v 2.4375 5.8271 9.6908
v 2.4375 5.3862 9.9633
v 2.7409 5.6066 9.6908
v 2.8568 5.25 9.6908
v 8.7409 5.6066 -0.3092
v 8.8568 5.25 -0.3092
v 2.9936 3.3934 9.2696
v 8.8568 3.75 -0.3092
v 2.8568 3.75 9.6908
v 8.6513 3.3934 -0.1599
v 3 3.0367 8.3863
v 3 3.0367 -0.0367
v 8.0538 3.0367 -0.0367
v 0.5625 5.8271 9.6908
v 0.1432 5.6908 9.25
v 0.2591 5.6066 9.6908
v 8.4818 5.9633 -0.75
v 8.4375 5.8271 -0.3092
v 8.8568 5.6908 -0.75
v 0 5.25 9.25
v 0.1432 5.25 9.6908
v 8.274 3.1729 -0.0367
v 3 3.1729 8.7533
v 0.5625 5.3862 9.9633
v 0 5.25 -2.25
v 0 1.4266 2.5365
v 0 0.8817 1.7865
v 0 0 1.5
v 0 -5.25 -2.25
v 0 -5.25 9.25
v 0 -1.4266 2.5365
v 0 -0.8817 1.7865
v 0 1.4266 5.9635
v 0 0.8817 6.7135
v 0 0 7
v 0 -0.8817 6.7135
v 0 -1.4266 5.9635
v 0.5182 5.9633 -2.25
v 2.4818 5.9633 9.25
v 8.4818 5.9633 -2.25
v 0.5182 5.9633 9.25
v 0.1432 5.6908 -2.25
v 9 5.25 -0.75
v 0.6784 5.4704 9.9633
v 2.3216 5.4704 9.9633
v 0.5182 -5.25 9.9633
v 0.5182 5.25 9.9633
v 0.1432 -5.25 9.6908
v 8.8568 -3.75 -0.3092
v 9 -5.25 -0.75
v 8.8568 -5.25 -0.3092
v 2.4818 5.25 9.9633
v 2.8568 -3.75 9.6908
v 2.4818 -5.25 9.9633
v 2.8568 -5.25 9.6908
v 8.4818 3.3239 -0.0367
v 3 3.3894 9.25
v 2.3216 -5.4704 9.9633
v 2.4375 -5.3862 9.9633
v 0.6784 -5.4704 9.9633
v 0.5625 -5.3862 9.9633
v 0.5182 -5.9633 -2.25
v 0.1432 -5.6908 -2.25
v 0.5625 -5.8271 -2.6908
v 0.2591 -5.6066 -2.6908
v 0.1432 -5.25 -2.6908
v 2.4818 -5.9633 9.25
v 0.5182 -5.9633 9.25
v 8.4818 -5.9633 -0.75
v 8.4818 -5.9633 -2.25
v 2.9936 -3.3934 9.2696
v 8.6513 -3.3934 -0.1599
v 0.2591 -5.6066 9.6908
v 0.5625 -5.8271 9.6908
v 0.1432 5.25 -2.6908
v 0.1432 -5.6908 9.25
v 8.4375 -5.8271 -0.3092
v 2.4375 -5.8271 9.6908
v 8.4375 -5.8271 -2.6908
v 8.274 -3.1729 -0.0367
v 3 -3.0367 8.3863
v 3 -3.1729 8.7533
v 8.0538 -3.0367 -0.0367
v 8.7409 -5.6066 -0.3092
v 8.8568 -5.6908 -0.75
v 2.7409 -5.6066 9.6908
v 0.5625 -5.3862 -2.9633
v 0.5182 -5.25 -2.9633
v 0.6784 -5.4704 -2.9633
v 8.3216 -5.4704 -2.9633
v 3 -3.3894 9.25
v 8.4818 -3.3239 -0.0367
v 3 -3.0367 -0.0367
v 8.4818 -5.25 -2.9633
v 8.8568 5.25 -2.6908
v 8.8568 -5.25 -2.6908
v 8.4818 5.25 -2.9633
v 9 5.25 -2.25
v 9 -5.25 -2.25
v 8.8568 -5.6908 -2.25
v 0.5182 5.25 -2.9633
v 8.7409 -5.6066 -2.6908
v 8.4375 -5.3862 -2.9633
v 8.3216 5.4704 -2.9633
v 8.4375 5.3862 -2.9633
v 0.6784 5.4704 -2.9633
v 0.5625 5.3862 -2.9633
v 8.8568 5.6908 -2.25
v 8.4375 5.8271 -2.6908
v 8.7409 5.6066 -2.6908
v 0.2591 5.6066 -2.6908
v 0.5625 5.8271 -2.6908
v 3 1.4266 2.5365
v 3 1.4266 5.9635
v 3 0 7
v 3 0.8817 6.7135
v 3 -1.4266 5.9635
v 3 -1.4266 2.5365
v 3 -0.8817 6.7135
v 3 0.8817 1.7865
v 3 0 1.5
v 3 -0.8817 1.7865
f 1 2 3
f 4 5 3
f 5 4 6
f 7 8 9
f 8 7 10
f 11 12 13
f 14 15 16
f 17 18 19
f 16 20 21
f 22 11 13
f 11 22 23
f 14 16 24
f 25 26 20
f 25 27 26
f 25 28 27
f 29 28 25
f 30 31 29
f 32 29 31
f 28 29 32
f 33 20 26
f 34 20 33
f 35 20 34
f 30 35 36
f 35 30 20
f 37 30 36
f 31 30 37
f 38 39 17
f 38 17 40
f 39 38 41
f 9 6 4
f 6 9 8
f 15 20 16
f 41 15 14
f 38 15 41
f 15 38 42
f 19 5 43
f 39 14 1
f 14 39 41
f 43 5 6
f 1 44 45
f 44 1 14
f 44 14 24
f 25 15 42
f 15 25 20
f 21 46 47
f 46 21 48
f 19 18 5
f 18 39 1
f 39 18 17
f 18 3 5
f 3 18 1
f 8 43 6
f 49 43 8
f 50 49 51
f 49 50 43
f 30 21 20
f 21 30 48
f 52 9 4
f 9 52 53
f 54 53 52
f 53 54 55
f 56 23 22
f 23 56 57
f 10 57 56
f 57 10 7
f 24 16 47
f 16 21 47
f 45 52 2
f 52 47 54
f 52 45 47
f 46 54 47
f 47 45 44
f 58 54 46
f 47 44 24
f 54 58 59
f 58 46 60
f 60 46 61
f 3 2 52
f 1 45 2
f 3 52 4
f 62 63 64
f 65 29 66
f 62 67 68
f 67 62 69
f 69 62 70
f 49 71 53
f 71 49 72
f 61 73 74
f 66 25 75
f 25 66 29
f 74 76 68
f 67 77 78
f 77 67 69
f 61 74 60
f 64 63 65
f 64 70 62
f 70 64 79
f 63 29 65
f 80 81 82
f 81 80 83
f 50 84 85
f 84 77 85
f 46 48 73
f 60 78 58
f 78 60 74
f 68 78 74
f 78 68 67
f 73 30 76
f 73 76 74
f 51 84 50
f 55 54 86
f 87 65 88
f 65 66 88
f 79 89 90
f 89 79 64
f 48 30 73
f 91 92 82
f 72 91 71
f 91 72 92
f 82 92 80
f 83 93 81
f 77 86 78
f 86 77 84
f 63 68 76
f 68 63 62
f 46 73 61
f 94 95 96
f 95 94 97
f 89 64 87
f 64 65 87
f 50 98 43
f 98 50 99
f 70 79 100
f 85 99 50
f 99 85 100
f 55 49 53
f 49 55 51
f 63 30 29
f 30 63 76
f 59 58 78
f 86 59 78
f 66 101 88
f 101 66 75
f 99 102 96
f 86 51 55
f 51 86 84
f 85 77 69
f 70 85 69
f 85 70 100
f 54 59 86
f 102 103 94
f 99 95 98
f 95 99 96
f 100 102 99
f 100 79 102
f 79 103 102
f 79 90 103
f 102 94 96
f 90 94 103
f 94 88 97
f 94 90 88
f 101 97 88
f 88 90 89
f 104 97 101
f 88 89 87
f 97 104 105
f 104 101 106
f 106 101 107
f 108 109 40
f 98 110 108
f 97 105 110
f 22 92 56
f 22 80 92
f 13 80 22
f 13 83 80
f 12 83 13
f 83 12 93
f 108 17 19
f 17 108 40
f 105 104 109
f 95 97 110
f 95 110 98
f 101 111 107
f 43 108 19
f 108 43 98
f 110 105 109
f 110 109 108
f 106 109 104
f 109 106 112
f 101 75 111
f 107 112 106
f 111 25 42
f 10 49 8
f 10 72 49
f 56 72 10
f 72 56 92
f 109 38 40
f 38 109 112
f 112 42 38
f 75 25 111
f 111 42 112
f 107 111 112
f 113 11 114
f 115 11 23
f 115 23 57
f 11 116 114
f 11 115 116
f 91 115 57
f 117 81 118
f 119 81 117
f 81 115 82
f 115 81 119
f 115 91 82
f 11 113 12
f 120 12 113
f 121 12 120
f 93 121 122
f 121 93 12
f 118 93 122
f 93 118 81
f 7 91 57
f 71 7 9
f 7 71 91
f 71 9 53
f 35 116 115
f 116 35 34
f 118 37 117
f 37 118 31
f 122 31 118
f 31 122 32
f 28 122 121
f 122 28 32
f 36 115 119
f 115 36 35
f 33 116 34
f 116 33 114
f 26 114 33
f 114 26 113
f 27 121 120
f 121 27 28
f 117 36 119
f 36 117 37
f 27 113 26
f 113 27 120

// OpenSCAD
$fn=10;

angle_bracket(base=9, height=13);

module angle_bracket(base=12, height=12, width=12, thickness=3, hole_diameter=3)
{
    radius = min(base, height, width, thickness)/4;
    
    b = base - 2*radius;
    h = height - 2*radius;
    w = width - 2*radius;
    t = thickness - 2*radius;
    
    translate([radius, -w/2, -t-radius]) difference(){
        minkowski() {
            union(){
                cube([b, w, t]);
                cube([t, w, h]);
                translate([t, 0, t])
                    polyhedron(
                        points=[[0,0,0],[b-t,0,0],[0,0,h-t],
                                [0,t,0],[b-t,t,0],[0,t,h-t]],
                        faces=[[0,1,4,3],[2,0,3,5],[2,5,4,1],[2,1,0],[5,3,4]]
                    );
                translate([t, w-t, t])
                    polyhedron(
                        points=[[0,0,0],[b-t,0,0],[0,0,h-t],
                                [0,t,0],[b-t,t,0],[0,t,h-t]],
                        faces=[[0,1,4,3],[2,0,3,5],[2,5,4,1],[2,1,0],[5,3,4]]
                    );
            } // union()
            sphere(r=radius);
        } // minkowski()
        
        gap = min(base-thickness, height-thickness, width-thickness*2)/2;
        
        hull() {
            translate([-2*radius, w/2, -radius+thickness+gap])
                rotate([0,90,0]) cylinder(h=t+4*radius, r=hole_diameter/2);
            translate([-2*radius, w/2, height-radius-gap-hole_diameter/2])
                rotate([0,90,0]) cylinder(h=t+4*radius, r=hole_diameter/2);
        } // hull()
        echo(height-thickness-gap);
    }
}
